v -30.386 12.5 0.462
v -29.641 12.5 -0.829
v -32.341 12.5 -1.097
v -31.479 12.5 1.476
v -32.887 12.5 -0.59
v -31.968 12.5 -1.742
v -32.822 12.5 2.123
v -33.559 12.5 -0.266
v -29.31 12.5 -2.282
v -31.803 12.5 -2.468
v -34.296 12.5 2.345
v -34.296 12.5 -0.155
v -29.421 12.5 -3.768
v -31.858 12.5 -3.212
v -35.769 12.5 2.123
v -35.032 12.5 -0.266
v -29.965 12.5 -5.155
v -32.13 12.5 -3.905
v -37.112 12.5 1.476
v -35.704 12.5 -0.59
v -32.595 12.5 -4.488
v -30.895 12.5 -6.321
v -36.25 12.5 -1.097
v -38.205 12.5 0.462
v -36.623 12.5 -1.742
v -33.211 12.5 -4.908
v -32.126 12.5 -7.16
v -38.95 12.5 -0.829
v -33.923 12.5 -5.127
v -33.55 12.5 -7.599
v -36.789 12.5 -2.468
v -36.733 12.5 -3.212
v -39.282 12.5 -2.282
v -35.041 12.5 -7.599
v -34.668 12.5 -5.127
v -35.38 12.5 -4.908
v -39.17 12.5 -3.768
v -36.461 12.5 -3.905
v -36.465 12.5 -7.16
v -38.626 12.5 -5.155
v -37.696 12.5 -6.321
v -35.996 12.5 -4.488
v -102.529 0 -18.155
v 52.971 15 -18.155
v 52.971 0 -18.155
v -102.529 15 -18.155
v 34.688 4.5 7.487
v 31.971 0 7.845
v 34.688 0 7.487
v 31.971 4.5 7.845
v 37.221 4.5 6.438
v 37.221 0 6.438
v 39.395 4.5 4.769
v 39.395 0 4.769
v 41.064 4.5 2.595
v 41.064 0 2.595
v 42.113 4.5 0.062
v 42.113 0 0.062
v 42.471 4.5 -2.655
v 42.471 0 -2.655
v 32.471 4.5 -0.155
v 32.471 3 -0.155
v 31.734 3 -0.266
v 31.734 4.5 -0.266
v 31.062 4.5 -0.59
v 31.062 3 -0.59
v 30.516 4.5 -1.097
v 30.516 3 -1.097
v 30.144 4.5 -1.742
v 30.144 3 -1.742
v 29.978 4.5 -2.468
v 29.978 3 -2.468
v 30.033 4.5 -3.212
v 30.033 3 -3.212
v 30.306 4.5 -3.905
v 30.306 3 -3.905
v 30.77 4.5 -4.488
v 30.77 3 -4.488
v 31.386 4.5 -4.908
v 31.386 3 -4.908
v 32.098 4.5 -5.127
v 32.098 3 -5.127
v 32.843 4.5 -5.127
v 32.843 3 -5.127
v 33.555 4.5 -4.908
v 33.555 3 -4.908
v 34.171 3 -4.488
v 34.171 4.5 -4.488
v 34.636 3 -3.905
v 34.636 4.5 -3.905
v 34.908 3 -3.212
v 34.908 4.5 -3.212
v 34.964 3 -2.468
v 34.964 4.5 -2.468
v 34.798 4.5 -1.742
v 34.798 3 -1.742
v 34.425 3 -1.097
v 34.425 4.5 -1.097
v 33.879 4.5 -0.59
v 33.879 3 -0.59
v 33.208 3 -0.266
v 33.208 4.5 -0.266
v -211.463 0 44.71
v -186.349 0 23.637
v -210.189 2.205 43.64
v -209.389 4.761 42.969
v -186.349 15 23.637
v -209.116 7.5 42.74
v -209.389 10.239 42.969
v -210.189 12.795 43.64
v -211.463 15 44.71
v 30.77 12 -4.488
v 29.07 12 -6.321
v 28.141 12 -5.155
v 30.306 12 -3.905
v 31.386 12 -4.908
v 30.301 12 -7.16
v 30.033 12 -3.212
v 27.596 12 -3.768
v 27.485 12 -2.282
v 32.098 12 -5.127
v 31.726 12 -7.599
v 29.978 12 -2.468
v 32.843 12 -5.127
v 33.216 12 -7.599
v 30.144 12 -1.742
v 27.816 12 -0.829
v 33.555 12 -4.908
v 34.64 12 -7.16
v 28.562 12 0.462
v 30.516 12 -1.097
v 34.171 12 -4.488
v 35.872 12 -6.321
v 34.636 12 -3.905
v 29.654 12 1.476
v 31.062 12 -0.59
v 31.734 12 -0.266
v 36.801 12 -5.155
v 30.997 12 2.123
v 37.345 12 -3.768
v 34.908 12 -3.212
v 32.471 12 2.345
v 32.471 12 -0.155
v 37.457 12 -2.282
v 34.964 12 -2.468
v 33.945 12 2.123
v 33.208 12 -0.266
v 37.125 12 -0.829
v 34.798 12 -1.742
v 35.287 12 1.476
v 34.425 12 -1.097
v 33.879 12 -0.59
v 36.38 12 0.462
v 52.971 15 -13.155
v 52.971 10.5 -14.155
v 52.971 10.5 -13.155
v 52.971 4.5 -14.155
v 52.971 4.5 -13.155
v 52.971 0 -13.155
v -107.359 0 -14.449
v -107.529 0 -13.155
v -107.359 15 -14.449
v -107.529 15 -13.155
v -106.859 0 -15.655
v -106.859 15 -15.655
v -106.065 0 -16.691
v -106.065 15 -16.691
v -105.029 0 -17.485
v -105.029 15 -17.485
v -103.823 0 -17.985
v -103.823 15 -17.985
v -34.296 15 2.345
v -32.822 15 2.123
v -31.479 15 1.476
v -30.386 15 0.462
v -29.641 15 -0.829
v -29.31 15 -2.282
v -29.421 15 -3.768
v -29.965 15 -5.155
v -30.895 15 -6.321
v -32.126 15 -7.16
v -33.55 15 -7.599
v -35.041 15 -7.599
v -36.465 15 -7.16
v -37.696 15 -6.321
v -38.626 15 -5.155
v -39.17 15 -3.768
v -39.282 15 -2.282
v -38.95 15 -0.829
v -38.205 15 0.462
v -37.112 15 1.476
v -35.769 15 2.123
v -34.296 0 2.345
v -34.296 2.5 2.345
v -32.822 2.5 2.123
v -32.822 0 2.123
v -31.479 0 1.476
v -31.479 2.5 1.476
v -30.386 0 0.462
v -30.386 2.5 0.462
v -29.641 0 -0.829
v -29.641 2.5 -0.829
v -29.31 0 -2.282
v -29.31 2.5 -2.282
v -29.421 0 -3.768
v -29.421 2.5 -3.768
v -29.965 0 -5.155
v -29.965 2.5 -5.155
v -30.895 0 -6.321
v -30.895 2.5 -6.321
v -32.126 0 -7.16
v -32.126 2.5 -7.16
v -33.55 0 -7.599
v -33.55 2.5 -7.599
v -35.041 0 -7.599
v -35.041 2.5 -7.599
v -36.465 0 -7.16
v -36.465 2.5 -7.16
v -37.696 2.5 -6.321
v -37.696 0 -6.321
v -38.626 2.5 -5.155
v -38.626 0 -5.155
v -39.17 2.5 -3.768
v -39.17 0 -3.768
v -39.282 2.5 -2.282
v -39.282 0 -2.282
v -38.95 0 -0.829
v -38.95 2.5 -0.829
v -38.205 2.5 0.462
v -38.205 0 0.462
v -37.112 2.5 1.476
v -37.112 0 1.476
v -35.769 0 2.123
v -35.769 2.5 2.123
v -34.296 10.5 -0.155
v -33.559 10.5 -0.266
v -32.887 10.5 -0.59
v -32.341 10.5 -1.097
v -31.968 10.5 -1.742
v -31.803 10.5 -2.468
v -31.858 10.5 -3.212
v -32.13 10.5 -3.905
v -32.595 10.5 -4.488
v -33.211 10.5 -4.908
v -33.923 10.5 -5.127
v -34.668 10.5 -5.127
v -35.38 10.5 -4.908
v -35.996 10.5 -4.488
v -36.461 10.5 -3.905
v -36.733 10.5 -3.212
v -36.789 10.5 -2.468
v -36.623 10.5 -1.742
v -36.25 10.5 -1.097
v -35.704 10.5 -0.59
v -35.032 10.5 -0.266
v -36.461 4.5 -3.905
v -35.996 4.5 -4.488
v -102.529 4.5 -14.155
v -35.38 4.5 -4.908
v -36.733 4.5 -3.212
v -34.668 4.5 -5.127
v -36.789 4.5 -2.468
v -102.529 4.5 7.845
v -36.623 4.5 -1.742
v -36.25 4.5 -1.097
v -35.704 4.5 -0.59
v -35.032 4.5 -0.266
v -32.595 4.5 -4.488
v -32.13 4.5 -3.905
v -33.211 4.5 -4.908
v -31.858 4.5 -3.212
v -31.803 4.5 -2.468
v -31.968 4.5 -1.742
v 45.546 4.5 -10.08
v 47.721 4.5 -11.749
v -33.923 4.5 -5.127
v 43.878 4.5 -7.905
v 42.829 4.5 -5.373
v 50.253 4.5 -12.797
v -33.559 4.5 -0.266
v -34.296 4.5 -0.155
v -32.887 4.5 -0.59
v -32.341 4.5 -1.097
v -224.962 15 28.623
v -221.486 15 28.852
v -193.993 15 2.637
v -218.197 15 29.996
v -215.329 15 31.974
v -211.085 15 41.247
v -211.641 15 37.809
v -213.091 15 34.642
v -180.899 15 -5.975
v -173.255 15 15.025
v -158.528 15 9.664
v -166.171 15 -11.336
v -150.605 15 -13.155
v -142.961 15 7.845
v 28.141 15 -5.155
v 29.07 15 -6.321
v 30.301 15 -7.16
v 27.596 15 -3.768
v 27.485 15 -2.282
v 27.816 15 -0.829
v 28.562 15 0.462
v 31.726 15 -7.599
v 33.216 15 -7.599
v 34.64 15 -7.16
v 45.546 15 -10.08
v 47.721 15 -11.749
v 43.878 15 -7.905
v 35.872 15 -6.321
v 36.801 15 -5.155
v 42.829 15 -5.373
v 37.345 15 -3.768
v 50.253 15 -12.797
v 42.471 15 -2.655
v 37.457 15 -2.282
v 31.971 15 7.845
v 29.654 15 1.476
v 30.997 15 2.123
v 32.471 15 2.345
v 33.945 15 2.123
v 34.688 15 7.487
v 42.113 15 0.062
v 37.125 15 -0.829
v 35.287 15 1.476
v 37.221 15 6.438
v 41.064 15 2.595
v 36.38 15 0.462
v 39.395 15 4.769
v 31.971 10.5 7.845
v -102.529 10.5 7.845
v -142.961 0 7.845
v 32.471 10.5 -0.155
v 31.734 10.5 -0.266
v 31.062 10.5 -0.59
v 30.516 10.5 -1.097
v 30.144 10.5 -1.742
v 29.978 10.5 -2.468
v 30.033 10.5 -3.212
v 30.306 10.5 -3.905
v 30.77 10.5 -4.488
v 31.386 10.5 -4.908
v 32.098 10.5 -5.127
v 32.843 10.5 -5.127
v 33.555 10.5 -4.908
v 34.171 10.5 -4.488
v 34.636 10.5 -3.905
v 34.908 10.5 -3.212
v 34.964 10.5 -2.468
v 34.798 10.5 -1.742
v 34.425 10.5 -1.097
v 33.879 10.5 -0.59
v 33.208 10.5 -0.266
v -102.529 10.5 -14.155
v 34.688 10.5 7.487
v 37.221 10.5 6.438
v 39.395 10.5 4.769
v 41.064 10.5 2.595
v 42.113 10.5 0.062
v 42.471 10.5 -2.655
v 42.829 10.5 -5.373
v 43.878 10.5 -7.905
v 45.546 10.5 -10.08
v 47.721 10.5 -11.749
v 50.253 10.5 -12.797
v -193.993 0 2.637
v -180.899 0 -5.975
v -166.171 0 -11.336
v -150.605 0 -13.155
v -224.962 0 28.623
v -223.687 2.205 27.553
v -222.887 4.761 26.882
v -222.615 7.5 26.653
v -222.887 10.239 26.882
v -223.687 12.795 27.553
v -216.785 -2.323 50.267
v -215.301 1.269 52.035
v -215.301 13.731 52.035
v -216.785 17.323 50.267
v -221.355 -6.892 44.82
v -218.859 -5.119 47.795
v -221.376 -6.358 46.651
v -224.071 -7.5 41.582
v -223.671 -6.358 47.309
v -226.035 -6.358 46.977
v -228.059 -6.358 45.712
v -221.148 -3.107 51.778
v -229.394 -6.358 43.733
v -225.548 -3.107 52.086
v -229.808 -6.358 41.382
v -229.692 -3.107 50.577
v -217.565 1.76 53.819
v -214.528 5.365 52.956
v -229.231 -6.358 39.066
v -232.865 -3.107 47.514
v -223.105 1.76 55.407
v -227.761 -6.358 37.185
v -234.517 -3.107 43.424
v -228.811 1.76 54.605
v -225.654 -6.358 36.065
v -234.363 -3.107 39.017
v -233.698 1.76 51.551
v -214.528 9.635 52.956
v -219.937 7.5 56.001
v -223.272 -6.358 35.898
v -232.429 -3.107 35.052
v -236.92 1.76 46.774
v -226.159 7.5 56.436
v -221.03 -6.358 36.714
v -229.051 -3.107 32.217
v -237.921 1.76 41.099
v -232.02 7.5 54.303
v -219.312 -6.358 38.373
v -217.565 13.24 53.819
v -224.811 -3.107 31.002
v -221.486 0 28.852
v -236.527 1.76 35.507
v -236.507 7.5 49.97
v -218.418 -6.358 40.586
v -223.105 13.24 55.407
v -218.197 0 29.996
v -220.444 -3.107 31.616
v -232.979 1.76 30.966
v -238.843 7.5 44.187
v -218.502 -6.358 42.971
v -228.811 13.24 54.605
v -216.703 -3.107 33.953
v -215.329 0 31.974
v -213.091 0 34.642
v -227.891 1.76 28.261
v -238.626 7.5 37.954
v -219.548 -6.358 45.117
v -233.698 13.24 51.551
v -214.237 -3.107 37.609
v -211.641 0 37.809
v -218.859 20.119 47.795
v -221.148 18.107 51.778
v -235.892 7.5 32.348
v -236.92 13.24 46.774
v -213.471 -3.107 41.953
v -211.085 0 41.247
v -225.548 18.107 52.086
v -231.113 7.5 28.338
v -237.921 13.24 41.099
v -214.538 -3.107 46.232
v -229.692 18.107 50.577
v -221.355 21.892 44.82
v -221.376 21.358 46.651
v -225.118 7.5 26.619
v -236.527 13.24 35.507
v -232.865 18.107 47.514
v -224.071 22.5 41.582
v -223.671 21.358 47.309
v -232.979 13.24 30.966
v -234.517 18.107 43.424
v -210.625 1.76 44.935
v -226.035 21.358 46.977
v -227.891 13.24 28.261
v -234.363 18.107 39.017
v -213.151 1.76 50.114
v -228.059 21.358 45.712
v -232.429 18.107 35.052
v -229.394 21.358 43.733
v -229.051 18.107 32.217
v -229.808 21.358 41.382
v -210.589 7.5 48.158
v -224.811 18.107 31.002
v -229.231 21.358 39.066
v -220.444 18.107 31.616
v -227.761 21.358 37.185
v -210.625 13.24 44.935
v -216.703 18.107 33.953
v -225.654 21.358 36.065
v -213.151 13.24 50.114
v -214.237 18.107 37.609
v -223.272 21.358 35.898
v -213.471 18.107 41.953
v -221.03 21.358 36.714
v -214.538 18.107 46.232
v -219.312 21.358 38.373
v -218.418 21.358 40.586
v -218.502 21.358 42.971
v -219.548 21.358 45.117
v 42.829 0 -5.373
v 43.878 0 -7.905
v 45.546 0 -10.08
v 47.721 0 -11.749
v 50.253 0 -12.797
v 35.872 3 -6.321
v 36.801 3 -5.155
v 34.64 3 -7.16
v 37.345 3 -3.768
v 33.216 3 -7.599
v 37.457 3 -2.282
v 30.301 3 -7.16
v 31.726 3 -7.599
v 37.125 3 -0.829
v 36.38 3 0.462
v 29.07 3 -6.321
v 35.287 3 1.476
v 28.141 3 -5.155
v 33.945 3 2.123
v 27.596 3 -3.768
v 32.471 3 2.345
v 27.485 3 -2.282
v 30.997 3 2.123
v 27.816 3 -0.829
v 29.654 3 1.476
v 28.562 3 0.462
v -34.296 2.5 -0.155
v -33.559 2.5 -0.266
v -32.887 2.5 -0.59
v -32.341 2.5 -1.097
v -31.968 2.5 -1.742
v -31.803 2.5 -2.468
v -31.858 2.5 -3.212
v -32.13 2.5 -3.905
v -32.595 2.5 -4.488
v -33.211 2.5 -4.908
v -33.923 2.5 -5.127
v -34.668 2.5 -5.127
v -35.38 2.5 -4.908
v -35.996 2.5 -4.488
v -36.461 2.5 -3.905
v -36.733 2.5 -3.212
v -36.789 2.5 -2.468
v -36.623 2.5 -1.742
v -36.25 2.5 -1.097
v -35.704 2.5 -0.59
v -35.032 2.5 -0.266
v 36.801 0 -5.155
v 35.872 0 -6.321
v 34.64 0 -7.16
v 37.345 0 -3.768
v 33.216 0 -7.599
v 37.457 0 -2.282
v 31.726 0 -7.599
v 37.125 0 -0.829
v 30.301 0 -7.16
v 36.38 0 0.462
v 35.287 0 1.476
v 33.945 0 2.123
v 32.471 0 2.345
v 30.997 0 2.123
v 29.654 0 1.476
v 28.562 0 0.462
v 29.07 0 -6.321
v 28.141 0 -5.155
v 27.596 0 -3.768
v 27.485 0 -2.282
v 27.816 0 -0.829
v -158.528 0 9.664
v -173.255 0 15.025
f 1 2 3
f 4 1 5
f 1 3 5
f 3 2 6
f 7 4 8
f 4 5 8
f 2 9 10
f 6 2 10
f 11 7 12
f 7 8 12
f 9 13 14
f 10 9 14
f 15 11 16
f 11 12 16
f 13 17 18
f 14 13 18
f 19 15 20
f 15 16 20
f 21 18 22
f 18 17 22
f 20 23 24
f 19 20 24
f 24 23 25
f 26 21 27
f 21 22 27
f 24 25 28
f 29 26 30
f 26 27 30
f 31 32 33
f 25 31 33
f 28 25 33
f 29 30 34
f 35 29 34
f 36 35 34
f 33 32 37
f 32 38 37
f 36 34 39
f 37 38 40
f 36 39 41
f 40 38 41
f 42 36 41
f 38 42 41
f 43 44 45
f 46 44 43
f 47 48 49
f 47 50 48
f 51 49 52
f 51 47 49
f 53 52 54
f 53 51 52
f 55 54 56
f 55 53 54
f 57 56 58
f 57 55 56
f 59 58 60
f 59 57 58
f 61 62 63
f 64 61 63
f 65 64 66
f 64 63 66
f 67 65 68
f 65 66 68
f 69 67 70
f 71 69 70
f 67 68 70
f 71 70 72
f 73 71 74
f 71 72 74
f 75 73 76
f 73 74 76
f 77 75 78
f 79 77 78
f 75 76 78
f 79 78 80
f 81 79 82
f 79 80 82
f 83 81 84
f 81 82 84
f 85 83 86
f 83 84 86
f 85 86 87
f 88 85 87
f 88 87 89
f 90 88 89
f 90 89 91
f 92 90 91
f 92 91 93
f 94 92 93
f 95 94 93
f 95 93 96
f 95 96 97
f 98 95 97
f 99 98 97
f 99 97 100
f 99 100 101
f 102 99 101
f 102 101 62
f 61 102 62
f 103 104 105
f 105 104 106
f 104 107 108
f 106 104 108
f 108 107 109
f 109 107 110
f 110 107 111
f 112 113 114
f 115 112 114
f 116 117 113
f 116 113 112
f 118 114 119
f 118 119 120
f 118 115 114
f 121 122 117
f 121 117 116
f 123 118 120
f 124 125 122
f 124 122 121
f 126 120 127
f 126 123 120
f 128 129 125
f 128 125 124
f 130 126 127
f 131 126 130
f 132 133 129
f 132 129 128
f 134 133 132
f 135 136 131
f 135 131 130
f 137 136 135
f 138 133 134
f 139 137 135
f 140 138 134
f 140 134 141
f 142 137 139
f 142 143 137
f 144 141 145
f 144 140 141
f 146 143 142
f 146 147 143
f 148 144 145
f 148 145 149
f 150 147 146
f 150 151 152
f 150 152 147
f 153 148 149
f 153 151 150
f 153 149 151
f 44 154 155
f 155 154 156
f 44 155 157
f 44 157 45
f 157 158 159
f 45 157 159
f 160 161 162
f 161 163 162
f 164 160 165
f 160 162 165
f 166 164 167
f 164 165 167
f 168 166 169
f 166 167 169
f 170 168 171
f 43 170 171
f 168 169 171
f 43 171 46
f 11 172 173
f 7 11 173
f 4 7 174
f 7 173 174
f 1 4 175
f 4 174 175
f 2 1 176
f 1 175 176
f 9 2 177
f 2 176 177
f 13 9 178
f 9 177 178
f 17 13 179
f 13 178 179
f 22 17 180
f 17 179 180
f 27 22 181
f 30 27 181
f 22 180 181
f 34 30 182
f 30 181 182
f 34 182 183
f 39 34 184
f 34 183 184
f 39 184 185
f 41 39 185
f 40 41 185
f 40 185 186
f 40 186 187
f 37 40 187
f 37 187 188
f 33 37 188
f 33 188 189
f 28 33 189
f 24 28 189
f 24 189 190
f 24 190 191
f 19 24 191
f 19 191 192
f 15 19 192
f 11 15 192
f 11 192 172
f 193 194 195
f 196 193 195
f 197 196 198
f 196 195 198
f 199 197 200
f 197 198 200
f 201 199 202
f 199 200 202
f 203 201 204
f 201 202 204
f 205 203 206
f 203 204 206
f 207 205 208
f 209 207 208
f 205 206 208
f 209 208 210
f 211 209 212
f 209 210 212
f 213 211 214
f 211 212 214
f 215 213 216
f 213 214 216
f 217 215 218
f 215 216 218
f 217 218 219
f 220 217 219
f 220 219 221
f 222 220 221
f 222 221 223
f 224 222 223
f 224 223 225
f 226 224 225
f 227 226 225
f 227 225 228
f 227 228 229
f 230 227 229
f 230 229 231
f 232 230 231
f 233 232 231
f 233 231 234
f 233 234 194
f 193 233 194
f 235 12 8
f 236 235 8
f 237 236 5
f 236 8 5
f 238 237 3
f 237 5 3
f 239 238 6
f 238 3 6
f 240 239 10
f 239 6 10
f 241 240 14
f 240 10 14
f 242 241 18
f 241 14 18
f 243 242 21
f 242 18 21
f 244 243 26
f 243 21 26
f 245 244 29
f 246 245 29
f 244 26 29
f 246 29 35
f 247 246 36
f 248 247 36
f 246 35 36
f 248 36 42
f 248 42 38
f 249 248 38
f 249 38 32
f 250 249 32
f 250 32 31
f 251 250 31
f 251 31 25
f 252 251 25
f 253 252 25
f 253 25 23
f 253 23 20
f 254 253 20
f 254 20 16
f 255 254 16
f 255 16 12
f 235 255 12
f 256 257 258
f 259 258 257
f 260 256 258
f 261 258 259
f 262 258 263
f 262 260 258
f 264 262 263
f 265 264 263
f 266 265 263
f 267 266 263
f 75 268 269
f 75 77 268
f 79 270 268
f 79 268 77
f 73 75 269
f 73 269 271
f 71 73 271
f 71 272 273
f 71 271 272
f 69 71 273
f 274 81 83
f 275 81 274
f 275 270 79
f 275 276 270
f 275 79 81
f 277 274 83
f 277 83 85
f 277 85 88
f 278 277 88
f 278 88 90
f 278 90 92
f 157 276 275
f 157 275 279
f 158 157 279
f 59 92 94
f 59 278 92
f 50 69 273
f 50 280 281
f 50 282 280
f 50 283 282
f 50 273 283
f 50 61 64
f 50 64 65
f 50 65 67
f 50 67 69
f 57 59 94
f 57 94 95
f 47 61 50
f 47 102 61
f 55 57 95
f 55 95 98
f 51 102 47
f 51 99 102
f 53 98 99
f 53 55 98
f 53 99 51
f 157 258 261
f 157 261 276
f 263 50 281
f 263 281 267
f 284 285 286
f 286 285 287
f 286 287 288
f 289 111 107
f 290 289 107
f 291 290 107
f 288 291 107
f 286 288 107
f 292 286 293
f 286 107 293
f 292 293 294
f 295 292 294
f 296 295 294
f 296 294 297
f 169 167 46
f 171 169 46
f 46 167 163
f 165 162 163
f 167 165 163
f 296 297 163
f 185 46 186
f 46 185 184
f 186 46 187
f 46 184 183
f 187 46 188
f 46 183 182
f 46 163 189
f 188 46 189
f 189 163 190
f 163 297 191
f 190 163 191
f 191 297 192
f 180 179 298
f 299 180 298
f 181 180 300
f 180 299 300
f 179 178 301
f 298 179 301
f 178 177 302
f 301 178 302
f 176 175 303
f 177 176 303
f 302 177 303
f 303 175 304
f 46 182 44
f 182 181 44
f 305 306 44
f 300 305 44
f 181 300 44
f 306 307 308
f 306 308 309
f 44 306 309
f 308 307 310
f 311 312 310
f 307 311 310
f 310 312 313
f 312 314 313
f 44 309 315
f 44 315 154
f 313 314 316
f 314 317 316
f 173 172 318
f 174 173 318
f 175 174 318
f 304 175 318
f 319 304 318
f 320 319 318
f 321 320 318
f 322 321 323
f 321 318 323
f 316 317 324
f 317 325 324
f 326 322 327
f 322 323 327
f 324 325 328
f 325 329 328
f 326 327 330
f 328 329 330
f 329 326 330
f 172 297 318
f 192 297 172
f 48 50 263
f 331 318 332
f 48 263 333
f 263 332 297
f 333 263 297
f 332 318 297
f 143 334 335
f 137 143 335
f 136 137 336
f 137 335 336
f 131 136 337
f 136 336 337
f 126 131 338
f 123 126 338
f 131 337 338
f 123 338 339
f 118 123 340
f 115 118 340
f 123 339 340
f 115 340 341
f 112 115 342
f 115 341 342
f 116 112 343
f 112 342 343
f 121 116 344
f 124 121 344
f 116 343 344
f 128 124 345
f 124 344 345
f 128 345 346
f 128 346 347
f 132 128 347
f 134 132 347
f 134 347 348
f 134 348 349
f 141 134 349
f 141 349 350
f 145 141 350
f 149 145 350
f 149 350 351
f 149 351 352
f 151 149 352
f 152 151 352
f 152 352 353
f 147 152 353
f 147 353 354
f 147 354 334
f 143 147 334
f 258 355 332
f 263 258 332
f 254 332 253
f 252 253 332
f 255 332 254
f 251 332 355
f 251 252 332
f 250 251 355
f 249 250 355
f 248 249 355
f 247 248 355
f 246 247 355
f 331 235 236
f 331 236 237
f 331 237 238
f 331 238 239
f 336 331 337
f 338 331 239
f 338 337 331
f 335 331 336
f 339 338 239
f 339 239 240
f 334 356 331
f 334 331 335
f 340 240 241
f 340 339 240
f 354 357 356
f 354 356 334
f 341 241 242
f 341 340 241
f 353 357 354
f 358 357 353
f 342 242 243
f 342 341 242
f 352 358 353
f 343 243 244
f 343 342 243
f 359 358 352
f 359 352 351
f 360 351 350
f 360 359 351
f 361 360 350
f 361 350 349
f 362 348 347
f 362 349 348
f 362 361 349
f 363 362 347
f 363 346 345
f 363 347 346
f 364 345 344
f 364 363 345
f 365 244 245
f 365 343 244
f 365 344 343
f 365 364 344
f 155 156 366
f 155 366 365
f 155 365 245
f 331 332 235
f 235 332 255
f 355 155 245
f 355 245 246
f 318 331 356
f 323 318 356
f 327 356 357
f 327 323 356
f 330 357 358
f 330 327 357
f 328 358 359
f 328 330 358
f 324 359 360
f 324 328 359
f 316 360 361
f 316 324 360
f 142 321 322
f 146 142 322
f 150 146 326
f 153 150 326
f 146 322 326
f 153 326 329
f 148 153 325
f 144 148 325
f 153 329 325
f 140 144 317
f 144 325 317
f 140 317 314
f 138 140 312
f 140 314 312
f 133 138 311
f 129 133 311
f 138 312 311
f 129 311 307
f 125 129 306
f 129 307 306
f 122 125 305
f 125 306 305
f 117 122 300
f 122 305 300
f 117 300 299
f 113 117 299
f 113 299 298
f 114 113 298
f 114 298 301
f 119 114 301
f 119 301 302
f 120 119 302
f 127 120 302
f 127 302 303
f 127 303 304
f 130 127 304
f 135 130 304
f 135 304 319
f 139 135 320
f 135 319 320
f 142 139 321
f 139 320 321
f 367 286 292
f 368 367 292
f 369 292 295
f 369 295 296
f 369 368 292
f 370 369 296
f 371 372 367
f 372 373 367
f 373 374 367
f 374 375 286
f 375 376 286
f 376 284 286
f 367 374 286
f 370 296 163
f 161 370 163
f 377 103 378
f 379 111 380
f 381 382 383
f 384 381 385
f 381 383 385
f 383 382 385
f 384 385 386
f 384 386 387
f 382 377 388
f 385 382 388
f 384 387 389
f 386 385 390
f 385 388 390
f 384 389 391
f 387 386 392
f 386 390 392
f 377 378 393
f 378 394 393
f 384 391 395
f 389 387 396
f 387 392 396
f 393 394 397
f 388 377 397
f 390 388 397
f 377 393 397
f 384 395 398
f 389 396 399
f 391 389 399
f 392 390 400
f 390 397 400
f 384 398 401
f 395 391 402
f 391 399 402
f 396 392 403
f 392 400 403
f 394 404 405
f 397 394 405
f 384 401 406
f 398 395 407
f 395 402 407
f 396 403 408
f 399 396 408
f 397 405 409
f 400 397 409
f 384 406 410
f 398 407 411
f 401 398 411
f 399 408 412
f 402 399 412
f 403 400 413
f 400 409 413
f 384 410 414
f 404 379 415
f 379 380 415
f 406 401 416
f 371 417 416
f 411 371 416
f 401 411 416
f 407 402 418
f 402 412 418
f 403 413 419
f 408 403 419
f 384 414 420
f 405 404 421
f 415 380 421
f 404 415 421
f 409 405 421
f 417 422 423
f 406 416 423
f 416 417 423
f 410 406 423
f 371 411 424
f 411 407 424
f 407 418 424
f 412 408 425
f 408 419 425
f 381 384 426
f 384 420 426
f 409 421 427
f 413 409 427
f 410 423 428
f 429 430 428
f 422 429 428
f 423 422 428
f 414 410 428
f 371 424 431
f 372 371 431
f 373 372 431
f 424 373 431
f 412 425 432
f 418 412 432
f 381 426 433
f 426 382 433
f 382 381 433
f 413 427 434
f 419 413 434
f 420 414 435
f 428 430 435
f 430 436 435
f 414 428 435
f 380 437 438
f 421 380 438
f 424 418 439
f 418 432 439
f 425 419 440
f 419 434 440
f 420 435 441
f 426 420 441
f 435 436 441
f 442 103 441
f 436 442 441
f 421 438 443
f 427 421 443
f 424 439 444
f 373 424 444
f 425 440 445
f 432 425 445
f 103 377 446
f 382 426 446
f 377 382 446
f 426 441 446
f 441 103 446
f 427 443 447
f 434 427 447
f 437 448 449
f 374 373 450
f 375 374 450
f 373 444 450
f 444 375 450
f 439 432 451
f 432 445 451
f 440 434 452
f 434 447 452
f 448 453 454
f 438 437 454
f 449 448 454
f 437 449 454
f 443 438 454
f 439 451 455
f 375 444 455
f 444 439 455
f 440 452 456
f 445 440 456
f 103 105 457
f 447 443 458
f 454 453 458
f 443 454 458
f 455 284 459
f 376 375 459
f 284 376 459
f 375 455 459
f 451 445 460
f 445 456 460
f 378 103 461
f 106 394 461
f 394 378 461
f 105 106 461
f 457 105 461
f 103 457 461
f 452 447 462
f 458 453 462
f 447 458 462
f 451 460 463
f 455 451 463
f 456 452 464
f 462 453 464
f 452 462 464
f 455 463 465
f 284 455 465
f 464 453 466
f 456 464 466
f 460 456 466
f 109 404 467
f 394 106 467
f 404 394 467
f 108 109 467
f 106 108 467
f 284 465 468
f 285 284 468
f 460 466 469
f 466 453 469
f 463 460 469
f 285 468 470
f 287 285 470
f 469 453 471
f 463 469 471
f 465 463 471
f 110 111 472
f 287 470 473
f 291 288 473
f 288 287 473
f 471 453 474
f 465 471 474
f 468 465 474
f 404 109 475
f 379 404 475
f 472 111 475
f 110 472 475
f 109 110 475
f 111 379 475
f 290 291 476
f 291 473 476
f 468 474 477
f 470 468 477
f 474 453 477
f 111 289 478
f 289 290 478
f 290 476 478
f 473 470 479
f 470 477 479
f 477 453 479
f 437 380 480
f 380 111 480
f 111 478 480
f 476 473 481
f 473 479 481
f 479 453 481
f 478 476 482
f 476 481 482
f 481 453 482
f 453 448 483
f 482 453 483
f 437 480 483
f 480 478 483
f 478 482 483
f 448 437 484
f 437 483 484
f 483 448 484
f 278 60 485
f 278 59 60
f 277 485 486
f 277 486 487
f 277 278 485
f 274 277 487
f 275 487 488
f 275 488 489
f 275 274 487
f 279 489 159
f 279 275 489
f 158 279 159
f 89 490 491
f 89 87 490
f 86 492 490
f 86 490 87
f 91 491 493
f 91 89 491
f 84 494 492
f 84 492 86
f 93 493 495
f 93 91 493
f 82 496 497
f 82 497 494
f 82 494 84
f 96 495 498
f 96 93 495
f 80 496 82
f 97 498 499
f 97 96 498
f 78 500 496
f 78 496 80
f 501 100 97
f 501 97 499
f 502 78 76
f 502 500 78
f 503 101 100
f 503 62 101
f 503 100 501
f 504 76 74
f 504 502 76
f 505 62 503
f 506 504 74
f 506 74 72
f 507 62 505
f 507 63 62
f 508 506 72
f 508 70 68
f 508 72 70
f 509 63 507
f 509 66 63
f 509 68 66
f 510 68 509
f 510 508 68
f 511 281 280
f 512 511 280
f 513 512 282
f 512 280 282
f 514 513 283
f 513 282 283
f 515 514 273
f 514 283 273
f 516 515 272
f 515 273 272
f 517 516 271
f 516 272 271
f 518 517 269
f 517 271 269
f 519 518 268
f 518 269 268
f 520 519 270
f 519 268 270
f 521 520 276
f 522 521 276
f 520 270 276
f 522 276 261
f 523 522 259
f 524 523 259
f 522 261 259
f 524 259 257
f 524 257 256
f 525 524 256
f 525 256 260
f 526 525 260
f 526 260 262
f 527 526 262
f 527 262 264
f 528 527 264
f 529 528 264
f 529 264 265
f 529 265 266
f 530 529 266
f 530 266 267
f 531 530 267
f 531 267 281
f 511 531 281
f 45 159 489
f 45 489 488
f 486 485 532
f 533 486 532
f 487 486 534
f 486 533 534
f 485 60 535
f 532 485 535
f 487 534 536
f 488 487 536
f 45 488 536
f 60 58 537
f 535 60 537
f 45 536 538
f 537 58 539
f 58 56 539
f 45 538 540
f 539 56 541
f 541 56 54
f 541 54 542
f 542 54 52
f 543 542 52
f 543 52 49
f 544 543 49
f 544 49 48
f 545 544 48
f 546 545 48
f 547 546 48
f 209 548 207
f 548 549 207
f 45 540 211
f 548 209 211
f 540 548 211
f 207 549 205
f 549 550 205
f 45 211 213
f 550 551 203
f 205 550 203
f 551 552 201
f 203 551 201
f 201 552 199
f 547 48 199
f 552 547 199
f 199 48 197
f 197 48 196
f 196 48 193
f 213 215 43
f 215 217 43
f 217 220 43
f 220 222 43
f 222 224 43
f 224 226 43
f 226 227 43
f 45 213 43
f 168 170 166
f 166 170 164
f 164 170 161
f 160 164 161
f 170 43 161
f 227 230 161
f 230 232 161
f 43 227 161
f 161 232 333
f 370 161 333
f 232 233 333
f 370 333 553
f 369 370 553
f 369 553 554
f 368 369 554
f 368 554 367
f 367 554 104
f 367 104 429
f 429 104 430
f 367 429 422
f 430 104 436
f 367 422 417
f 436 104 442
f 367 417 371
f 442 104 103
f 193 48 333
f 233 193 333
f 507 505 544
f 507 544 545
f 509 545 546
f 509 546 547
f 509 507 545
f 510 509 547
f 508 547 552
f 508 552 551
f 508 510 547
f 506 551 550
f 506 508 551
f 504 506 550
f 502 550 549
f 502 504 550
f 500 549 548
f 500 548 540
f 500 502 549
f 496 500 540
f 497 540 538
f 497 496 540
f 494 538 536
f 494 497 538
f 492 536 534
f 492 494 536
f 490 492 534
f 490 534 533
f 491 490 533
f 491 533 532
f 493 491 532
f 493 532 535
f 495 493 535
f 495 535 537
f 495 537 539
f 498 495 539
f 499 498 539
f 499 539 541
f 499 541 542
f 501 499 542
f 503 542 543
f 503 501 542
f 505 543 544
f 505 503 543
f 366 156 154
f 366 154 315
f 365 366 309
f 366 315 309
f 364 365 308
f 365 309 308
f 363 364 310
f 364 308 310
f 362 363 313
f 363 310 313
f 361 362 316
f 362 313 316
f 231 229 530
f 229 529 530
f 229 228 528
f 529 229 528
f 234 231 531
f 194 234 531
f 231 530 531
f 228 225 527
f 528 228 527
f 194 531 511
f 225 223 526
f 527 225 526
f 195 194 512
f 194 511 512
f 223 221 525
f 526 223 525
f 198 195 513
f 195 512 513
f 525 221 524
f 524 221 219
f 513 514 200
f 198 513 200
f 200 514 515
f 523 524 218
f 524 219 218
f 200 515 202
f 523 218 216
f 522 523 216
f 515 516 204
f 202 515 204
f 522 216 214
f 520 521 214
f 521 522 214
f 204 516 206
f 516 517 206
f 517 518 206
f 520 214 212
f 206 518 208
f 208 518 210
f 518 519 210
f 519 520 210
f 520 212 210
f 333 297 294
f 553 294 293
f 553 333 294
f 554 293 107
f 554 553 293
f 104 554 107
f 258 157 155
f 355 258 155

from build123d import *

# Parameters (mm, degrees)
SKETCH_1_W          = 150
SKETCH_1_H          = 21.000000000000004
EXTRUDE_1_DEPTH     = 15
CUT_EXTRUDE_1_DEPTH = 145
SKETCH_3_R          = 5.000000000000004
CUT_EXTRUDE_2_DEPTH = 3
CUT_EXTRUDE_START   = -3
SKETCH_4_R          = 5.000000000000001
CUT_EXTRUDE_3_DEPTH = 3
SKETCH_5_R          = 2.4999999999999987
CUT_EXTRUDE_4_DEPTH = 20
SKETCH_6_R          = 5.000000000000001
CUT_EXTRUDE_5_DEPTH = 20
SKETCH_7_R          = 5.999999999999998
EXTRUDE_2_DEPTH     = 2
SKETCH_8_R          = 6.000000000000003
EXTRUDE_3_DEPTH     = 2
SKETCH_9_R          = 2.500000000000002
CUT_EXTRUDE_6_DEPTH = 20
EXTRUDE_5_DEPTH     = 15
EXTRUDE_6_DEPTH     = 5
FILLET_1_R          = 5
FILLET_2_R          = 10.5
FILLET_3_R          = 67.5
SKETCH_17_W         = 22.000000000000004
SKETCH_17_H         = 5.999999999999995
CUT_EXTRUDE_7_DEPTH = 200


with BuildPart() as part:
    # 草图1 → 凸台-拉伸1 (new body)
    with BuildSketch(Plane(origin=(0, 0, 0), x_dir=(1, 0, 0), z_dir=(0, 1, 0))):
        with Locations((-32.52921535893155, 2.6552587646076753)):
            Rectangle(SKETCH_1_W, SKETCH_1_H)
    extrude(amount=EXTRUDE_1_DEPTH)

    # 草图2 → 切除-拉伸1 (cut)
    with BuildSketch(Plane(origin=(42.470784641068455, 0, 0), x_dir=(0, 0, -1), z_dir=(1, 0, 0))):
        Polygon((-7.844741235392326, 10.499999999999998), (13.155258764607675, 10.499999999999998), (13.155258764607675, 4.500000000000001), (-7.844741235392326, 4.5), align=None)
    extrude(amount=-CUT_EXTRUDE_1_DEPTH, mode=Mode.SUBTRACT)

    # 草图3 → 切除-拉伸2 (cut)
    with BuildSketch(Plane(origin=(0, 15, 0), x_dir=(1, 0, 0), z_dir=(0, 1, 0))):
        with Locations(Location((32.47078464106845, 2.655258764607675, 0), (0, 0, 270))):
            Circle(SKETCH_3_R)
    extrude(amount=-CUT_EXTRUDE_2_DEPTH, mode=Mode.SUBTRACT)

    # 草图4 → 切除-拉伸3 (cut)
    with BuildSketch(Plane(origin=(0, 0, 0), x_dir=(-1, 0, 0), z_dir=(0, -1, 0)).offset(CUT_EXTRUDE_START)):
        with Locations(Location((-32.47078464106845, 2.655258764607675, 0), (0, 0, 270))):
            Circle(SKETCH_4_R)
    extrude(amount=CUT_EXTRUDE_3_DEPTH, mode=Mode.SUBTRACT)

    # 草图5 → 切除-拉伸4 (cut)
    with BuildSketch(Plane(origin=(0, 3, 0), x_dir=(-1, 0, 0), z_dir=(0, -1, 0))):
        with Locations(Location((-32.47078464106845, 2.655258764607675, 0), (0, 0, 270))):
            Circle(SKETCH_5_R)
    extrude(amount=-CUT_EXTRUDE_4_DEPTH, mode=Mode.SUBTRACT)

    # 草图6 → 切除-拉伸5 (cut)
    with BuildSketch(Plane(origin=(0, 15, 0), x_dir=(1, 0, 0), z_dir=(0, 1, 0))):
        with Locations(Location((-34.295534758931545, 2.655258764607675, 0), (0, 0, 270))):
            Circle(SKETCH_6_R)
    extrude(amount=-CUT_EXTRUDE_5_DEPTH, mode=Mode.SUBTRACT)

    # 草图7 → 凸台-拉伸2 (add)
    with BuildSketch(Plane(origin=(0, 4.5, 1.9e-16), x_dir=(1, 0, 0), z_dir=(0, 1, 4e-17))):
        with Locations((-34.295534758931545, 2.655258764607675)):
            Circle(SKETCH_7_R)
    extrude(amount=-EXTRUDE_2_DEPTH)

    # 草图8 → 凸台-拉伸3 (add)
    with BuildSketch(Plane(origin=(0, 10.499999999999998, 0), x_dir=(-1, 0, 0), z_dir=(0, -1, 0))):
        with Locations((34.295534758931545, 2.655258764607675)):
            Circle(SKETCH_8_R)
    extrude(amount=-EXTRUDE_3_DEPTH)

    # 草图9 → 切除-拉伸6 (cut)
    with BuildSketch(Plane(origin=(0, 12.499999999999998, 0), x_dir=(1, 0, 0), z_dir=(0, 1, 0))):
        with Locations(Location((-34.295534758931545, 2.655258764607675, 0), (0, 0, 270))):
            Circle(SKETCH_9_R)
    extrude(amount=-CUT_EXTRUDE_6_DEPTH, mode=Mode.SUBTRACT)



with BuildPart() as body_2:
    # 草图12 → 凸台-拉伸5 (new body)
    with BuildSketch(Plane(origin=(0, 15, 0), x_dir=(1, 0, 0), z_dir=(0, 1, 0))):
        Polygon((-107.52921535893154, -7.844741235392326), (-167.52921535893154, -7.844741235392335), (-217.32210416166507, -49.62593586501747), (-230.82064396508238, -33.53900255951896), (-175.17259027852143, 13.155258764607666), (-107.52921535893154, 13.155258764607675), align=None)
    extrude(amount=-EXTRUDE_5_DEPTH)

    # 草图13 → 旋转3 (revolve)
    with BuildSketch(Plane(origin=(-151.96584895321814, 0, 127.51448780818791), x_dir=(0.6427876096865401, 0, 0.7660444431189775), z_dir=(-0.7660444431189775, 0, 0.6427876096865401))):
        with BuildLine():
            Line((-112.17628346215061, 22.5), (-112.17628346215061, -7.5))
            ThreePointArc((-112.17628346215061, -7.5), (-97.17628346215061, 7.5), (-112.17628346215061, 22.5))
        make_face()
    revolve(axis=Axis((-224.0713740633737, 22.5, 41.58246921226819), (0, -1, 0)))


with BuildPart() as part_1:
    add(part.part)

    add(body_2.part)  # 凸台-拉伸6 merges body 2
    # 草图14 → 凸台-拉伸6 (add)
    with BuildSketch(Plane(origin=(0, 0, -13.155258764607675), x_dir=(-1, 0, 0), z_dir=(0, 0, -1))):
        Polygon((107.52921535893154, 15), (-52.97078464106847, 14.99999999999998), (-52.97078464106847, -3.99e-14), (107.52921535893154, 0), align=None)
    extrude(amount=EXTRUDE_6_DEPTH)

    # 圆角1
    fillet_1_edges = [part_1.edges().sort_by_distance(p)[0] for p in [
        (-107.52921535893154, 7.5, -18.155258764607673),
    ]]
    fillet(fillet_1_edges, radius=FILLET_1_R - 0.0001)  # a hair under: the kernel refuses the full size

    # 圆角2
    fillet_2_edges = [part_1.edges().sort_by_distance(p)[0] for p in [
        (42.470784641068455, 12.75, -13.155258764607675),
    ]]
    fillet(fillet_2_edges, radius=FILLET_2_R - 0.0001)  # a hair under: the kernel refuses the full size
    fillet_2_2_edges = [part_1.edges().sort_by_distance(p)[0] for p in [
        (42.470784641068455, 2.2500000000000004, -13.155258764607675),
    ]]
    fillet(fillet_2_2_edges, radius=FILLET_2_R - 0.0001)  # a hair under: the kernel refuses the full size
    fillet_2_3_edges = [part_1.edges().sort_by_distance(p)[0] for p in [
        (42.470784641068455, 2.25, 7.844741235392326),
    ]]
    fillet(fillet_2_3_edges, radius=FILLET_2_R)
    fillet_2_4_edges = [part_1.edges().sort_by_distance(p)[0] for p in [
        (42.470784641068455, 12.75, 7.844741235392326),
    ]]
    fillet(fillet_2_4_edges, radius=FILLET_2_R)

    # 圆角3
    fillet_3_edges = [part_1.edges().sort_by_distance(p)[0] for p in [
        (-167.52921535893154, 7.5, 7.844741235392335),
        (-175.17259027852143, 7.5, -13.155258764607666),
    ]]
    fillet(fillet_3_edges, radius=FILLET_3_R)

    # 草图17 → 切除-拉伸7 (cut)
    with BuildSketch(Plane(origin=(-102.52921535893152, 0, 0), x_dir=(0, 0, -1), z_dir=(1, 0, 0))):
        with Locations((3.1552587646076753, 7.500000000000001)):
            Rectangle(SKETCH_17_W, SKETCH_17_H)
    extrude(amount=CUT_EXTRUDE_7_DEPTH, mode=Mode.SUBTRACT)


solid = part_1.part
